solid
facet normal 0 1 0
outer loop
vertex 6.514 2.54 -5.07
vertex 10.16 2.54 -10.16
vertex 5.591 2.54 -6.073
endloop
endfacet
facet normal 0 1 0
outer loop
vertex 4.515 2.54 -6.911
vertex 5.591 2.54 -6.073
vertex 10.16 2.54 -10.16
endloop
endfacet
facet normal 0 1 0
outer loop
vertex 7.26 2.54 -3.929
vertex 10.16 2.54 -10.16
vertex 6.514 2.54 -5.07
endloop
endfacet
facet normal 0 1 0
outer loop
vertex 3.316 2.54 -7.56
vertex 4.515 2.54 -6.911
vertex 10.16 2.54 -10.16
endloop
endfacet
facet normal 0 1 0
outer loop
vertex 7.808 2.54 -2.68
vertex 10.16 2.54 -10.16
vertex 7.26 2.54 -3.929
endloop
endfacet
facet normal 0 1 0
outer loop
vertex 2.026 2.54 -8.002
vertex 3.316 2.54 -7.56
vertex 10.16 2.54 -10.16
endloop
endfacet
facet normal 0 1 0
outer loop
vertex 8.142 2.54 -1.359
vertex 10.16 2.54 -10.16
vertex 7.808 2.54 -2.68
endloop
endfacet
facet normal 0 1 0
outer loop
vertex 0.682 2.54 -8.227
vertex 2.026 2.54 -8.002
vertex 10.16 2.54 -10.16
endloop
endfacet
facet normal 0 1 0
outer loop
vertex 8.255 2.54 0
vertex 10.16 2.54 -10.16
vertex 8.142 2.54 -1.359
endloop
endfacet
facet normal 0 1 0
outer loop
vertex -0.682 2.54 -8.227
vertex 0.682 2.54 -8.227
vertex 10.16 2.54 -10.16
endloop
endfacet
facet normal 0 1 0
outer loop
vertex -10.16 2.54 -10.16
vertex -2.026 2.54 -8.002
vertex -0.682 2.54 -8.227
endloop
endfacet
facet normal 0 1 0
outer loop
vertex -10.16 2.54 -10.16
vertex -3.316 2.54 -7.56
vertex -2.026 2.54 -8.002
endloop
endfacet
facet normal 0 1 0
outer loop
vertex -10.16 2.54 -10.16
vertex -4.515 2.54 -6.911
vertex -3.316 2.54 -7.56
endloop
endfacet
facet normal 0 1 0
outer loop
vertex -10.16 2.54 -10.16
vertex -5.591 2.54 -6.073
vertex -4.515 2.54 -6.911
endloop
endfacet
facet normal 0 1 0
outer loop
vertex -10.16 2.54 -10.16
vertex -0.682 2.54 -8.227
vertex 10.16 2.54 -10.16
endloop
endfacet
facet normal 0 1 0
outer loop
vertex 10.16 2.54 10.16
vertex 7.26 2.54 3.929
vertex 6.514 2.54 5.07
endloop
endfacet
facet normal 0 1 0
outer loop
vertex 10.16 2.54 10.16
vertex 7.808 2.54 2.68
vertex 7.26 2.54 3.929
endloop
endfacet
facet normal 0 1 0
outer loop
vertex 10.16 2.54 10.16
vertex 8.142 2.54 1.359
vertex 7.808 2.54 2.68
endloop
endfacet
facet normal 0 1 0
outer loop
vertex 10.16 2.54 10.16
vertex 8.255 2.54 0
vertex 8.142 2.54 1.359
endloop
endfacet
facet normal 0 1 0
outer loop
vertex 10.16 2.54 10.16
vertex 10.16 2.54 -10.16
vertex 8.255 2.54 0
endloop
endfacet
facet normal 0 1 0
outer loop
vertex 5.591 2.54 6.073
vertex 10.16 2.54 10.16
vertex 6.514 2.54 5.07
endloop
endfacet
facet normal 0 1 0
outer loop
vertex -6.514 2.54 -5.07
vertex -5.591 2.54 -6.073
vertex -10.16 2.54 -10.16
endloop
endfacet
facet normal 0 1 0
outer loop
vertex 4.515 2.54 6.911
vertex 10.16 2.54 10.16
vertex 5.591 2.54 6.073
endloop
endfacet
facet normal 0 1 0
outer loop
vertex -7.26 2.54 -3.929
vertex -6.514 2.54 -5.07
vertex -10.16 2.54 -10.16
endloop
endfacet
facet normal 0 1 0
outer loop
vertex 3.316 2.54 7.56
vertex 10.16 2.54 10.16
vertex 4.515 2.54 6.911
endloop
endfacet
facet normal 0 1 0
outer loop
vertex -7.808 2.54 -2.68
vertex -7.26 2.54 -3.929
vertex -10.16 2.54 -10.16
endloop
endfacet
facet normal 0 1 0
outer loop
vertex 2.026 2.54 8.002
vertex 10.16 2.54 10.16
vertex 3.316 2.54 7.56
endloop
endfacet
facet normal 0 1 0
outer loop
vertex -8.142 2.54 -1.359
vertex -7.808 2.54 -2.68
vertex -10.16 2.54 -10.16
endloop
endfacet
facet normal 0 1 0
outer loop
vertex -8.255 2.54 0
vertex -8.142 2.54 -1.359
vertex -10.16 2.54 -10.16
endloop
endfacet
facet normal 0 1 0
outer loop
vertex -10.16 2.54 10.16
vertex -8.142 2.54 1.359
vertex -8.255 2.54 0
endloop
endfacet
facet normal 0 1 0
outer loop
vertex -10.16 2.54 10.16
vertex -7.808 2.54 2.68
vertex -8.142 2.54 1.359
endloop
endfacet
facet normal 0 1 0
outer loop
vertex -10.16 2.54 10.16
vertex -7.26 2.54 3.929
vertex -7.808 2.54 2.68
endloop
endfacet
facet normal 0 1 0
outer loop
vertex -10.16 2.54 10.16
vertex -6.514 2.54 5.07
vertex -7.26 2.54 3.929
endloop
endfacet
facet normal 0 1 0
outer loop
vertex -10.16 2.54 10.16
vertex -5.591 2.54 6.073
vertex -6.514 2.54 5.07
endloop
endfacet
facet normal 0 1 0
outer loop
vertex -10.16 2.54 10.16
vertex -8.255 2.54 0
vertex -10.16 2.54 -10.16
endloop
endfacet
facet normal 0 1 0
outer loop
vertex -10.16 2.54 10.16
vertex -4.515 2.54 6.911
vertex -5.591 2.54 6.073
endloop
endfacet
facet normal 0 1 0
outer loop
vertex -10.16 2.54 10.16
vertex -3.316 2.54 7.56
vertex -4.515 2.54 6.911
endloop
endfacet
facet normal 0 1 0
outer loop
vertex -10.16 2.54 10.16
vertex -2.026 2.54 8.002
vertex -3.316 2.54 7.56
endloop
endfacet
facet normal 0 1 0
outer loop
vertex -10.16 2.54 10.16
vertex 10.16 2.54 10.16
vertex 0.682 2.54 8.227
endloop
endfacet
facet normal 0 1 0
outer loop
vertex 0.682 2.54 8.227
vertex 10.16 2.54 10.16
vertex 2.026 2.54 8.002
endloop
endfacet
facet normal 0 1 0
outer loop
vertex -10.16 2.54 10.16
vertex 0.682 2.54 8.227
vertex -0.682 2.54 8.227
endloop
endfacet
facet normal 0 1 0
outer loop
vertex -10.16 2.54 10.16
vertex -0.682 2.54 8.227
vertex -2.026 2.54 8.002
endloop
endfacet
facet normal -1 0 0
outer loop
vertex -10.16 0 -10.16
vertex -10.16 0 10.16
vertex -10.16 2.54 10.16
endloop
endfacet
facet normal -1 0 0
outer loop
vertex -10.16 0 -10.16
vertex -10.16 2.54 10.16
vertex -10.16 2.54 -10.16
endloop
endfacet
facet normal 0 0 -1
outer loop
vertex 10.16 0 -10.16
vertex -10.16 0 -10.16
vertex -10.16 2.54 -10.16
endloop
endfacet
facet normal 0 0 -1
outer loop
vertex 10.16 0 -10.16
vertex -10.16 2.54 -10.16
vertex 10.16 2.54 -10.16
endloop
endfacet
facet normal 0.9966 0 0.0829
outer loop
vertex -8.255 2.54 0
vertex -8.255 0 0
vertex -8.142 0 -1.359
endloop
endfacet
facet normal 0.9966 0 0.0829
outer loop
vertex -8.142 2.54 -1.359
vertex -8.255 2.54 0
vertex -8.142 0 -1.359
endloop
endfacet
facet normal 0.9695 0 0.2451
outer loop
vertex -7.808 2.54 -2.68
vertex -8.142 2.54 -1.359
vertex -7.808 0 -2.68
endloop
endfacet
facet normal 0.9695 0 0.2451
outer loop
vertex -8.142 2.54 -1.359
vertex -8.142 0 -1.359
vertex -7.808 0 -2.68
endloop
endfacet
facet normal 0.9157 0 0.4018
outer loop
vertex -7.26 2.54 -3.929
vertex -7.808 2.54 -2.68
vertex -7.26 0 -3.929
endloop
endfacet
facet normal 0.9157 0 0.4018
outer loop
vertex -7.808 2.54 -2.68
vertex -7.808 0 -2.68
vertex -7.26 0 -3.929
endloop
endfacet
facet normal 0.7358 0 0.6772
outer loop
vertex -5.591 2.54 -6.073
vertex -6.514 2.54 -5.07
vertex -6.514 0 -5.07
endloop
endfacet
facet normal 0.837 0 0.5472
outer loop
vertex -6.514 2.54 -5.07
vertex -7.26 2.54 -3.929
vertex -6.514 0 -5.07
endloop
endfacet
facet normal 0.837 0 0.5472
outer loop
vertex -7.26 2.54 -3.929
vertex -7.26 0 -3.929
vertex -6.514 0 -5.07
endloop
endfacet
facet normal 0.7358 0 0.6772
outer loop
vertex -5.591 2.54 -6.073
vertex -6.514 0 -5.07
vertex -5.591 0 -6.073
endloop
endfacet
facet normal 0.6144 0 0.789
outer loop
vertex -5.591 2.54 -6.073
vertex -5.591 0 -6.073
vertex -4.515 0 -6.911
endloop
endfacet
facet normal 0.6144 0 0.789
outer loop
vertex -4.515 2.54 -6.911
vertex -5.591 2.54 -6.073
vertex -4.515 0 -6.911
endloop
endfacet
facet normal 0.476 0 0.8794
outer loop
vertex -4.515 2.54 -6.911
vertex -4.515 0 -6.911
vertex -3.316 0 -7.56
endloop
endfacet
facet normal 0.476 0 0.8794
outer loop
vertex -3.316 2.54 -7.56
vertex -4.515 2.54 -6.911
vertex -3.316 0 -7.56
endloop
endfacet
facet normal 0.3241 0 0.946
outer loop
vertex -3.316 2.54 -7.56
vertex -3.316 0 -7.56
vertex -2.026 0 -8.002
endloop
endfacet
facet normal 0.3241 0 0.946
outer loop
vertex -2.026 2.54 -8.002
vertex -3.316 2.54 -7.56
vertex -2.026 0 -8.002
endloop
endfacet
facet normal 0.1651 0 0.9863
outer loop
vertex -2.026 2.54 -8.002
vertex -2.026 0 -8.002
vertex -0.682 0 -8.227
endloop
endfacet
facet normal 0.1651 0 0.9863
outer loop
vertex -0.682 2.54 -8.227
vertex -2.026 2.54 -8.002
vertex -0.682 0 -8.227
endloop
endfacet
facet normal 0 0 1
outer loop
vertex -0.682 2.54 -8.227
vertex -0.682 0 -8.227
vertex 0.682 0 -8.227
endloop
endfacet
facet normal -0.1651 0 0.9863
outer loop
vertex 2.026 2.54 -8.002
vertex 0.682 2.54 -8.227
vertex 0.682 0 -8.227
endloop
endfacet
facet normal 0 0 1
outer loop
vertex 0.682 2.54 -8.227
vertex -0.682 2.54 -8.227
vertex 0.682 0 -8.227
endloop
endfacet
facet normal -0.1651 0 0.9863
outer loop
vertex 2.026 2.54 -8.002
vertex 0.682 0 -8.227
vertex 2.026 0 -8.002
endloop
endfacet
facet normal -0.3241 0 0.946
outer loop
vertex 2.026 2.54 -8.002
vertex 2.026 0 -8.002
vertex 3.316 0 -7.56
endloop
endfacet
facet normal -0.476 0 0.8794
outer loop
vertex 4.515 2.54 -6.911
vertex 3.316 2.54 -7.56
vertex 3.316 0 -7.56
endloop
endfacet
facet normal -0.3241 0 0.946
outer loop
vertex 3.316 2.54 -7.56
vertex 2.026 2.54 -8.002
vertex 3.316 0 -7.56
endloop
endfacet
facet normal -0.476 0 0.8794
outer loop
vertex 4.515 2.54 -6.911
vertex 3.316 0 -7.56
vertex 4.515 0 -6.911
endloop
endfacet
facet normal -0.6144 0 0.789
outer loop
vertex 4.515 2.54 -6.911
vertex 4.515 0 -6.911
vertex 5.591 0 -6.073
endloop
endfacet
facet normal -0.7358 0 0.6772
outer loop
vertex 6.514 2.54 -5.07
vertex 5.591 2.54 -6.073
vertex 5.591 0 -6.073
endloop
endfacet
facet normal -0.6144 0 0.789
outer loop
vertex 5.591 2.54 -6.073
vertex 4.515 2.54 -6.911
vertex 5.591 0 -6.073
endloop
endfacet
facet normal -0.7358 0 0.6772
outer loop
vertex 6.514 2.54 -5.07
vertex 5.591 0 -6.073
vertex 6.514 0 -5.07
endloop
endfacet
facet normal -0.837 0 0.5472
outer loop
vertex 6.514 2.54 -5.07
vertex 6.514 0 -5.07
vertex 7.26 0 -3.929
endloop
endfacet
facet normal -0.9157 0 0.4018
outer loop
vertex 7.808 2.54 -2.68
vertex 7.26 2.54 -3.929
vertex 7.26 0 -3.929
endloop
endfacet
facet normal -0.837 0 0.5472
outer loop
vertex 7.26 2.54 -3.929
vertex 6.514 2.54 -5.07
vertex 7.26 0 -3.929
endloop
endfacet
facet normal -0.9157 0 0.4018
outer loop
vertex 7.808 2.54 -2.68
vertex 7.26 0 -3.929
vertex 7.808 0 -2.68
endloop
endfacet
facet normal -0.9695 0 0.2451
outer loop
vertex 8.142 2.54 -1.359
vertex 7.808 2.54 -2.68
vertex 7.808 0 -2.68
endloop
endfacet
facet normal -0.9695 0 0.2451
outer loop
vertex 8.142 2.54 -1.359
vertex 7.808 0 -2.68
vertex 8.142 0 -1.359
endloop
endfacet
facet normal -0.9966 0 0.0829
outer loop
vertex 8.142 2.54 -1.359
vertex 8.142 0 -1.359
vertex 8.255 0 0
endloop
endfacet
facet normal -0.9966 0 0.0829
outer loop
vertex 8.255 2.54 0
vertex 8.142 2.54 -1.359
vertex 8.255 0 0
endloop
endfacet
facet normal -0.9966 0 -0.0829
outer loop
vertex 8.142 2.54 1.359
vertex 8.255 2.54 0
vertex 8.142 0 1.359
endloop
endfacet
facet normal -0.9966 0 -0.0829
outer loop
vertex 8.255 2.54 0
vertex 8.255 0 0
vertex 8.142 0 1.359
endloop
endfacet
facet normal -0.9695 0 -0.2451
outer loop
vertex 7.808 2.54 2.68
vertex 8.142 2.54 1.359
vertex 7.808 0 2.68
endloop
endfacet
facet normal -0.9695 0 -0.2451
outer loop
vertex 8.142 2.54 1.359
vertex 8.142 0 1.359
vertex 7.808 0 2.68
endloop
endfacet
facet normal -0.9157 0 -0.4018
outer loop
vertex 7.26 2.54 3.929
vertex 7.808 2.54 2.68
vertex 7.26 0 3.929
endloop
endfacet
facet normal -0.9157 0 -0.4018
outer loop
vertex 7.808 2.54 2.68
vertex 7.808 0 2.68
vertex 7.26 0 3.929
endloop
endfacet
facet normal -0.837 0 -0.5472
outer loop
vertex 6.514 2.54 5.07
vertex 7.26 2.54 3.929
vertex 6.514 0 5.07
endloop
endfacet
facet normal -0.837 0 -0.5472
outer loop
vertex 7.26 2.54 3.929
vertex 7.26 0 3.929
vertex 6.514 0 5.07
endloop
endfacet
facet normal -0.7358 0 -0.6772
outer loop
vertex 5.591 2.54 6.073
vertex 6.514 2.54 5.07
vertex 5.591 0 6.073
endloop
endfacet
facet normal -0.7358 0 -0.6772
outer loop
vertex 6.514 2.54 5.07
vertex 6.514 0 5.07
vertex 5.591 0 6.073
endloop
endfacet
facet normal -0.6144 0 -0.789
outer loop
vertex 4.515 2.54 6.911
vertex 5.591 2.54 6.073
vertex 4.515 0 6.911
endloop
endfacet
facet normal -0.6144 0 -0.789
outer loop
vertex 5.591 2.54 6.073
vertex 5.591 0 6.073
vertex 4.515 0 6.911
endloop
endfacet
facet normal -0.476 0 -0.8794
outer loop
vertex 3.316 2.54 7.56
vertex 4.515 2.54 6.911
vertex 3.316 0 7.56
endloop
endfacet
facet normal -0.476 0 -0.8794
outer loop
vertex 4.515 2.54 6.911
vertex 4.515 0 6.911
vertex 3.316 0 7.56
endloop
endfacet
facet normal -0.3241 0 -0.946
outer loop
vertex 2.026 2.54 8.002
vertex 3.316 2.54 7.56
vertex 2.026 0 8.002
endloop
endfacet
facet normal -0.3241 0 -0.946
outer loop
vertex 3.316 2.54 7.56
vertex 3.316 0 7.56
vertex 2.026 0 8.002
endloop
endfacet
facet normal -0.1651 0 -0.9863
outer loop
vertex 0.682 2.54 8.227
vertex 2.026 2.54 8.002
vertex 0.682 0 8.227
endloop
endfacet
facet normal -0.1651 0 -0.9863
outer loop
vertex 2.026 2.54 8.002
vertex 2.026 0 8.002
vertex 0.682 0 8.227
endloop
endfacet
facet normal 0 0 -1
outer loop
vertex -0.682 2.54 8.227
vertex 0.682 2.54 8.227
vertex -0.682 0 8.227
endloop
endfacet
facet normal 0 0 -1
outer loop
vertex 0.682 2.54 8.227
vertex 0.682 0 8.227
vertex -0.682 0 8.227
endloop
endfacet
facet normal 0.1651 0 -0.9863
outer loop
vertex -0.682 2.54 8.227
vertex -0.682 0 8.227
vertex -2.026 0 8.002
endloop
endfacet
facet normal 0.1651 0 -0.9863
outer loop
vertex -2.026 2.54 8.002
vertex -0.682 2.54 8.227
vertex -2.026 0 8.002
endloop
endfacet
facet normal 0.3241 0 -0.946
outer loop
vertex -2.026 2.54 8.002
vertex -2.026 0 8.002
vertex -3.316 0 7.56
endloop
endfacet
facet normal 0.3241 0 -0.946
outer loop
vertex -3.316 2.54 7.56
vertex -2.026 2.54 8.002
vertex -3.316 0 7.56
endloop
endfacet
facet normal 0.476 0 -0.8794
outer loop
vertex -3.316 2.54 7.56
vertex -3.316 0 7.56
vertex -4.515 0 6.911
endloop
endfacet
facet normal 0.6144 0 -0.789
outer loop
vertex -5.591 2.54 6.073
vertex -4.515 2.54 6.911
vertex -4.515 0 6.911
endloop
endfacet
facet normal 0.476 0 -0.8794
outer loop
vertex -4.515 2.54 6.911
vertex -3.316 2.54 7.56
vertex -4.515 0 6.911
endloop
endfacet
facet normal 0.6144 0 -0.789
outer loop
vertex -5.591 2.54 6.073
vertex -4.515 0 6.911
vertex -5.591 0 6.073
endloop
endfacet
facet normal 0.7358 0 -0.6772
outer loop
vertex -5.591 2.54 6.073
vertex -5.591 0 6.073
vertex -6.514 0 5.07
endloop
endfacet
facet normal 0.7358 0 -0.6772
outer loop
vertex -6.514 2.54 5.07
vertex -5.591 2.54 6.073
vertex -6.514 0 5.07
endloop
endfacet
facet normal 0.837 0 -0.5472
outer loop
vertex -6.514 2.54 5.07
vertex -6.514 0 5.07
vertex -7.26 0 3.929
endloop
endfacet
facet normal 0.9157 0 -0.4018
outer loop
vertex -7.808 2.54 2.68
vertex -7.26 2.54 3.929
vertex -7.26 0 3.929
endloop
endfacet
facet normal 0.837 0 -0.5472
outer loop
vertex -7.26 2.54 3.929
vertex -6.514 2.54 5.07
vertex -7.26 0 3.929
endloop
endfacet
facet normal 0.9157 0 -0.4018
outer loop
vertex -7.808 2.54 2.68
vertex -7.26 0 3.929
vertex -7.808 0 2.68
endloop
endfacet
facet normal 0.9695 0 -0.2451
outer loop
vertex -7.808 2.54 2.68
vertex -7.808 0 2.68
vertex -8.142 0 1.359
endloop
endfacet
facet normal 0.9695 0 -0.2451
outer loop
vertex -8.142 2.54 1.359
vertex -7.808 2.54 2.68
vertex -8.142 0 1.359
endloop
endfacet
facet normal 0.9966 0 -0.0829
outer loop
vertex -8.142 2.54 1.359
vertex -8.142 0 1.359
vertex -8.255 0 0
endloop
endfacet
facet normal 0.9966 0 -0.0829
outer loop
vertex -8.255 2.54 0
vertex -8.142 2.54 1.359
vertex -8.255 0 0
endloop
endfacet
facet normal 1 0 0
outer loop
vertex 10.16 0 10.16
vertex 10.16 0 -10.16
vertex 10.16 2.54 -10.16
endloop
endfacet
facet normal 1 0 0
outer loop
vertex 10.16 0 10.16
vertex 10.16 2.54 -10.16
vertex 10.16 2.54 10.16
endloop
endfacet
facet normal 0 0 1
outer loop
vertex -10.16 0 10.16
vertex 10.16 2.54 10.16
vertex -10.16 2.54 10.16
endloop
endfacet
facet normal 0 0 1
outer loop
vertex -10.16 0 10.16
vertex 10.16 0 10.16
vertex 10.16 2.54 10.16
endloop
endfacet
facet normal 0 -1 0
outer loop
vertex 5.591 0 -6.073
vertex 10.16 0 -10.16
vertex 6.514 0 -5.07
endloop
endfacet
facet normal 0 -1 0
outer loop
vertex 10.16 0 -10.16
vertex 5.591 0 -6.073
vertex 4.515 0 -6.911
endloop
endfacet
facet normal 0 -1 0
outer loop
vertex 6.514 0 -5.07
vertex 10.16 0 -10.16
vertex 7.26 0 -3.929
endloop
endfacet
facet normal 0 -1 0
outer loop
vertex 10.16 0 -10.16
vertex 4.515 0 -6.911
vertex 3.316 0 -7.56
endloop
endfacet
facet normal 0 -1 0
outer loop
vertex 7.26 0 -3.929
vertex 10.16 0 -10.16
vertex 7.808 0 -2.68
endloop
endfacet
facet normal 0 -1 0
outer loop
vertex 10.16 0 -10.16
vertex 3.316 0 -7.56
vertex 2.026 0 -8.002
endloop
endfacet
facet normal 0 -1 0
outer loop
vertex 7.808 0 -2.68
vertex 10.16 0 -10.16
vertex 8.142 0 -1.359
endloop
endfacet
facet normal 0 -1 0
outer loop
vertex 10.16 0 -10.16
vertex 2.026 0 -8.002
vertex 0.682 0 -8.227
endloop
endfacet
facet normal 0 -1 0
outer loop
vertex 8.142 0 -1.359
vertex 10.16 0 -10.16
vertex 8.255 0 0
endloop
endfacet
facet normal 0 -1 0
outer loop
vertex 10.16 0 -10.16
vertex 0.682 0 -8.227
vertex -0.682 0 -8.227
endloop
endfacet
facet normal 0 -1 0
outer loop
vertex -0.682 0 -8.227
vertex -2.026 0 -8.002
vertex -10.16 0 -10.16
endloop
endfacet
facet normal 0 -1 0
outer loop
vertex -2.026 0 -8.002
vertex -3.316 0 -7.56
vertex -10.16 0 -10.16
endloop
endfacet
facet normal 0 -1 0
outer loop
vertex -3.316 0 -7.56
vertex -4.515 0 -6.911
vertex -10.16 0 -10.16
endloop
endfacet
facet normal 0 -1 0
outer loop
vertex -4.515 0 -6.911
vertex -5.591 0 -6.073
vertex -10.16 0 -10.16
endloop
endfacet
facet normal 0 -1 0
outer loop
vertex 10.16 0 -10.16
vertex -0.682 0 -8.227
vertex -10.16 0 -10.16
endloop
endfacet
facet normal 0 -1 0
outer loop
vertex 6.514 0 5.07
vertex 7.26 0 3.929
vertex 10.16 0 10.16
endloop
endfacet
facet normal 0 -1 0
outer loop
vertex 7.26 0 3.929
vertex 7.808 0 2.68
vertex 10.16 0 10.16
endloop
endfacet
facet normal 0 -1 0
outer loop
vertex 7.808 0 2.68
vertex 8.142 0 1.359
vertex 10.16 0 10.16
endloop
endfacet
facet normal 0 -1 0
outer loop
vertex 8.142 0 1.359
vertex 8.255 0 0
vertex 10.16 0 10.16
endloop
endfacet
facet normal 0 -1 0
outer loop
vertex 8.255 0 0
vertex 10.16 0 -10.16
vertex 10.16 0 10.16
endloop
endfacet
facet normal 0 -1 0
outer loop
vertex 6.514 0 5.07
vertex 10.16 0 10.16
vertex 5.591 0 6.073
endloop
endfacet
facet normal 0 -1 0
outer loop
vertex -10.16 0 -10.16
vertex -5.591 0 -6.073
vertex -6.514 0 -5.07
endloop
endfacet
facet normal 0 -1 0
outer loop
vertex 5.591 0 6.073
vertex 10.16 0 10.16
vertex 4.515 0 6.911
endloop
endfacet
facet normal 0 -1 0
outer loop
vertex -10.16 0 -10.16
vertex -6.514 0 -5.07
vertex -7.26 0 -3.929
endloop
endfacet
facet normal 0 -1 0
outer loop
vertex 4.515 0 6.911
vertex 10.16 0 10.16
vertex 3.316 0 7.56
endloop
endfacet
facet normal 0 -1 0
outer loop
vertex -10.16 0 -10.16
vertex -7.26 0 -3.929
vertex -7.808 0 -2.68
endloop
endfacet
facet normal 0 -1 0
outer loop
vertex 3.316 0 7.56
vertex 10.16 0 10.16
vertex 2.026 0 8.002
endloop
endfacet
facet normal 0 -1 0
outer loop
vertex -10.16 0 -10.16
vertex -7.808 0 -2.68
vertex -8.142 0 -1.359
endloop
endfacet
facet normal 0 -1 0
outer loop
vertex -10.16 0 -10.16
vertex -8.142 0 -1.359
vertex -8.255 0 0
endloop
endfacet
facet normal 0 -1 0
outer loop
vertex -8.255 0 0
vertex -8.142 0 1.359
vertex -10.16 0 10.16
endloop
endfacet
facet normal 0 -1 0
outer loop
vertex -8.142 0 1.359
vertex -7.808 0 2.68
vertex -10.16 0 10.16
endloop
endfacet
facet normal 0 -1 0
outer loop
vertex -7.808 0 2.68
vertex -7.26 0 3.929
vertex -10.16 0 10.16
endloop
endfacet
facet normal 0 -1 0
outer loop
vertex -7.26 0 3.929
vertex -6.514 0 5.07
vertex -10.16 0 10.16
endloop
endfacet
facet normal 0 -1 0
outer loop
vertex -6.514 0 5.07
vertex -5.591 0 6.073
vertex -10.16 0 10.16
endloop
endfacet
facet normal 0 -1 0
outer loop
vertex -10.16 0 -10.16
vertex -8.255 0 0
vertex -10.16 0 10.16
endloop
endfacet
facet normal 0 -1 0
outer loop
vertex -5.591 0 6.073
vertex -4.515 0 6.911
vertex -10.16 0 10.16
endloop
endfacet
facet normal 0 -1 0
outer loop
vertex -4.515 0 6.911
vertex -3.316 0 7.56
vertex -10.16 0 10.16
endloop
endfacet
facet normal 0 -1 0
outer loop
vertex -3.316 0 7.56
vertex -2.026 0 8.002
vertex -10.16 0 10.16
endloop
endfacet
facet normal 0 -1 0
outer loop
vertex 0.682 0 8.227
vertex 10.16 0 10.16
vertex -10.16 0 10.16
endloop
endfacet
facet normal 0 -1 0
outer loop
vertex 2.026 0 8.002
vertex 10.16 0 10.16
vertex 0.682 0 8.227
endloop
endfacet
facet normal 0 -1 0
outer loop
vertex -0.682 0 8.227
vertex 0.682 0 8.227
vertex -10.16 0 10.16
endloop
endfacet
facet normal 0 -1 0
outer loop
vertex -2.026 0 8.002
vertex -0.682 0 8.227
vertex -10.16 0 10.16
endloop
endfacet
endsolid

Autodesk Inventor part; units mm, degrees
ref_plane "YZ Plane" through (0, 0, 0) normal (1, 0, 0) x (0, 1, 0)
ref_plane "XZ Plane" through (0, 0, 0) normal (0, 1, 0) x (-1, 0, 0)
ref_plane "XY Plane" through (0, 0, 0) normal (0, 0, 1) x (1, 0, 0)
sketch "Sketch1" plane through (0, 0, 0) normal (0, 1, 0) x (-1, 0, 0)
  circle A0 centre (0, 0) radius 8.255
  line L0 (10.16, -10.16) -> (-10.16, -10.16)
  line L1 (-10.16, -10.16) -> (-10.16, 10.16)
  line L2 (-10.16, 10.16) -> (10.16, 10.16)
  line L3 (10.16, 10.16) -> (10.16, -10.16)
  dimension "d0" = 16.51
  dimension "d4" = 20.32
  dimension "d5" = 10.16
  dimension "d6" = 20.32
  dimension "d7" = 10.16
extrude "Extrusion2" add sketch "Sketch1" along normal blind 2.54
properties part number "MarbleRingTest3"
